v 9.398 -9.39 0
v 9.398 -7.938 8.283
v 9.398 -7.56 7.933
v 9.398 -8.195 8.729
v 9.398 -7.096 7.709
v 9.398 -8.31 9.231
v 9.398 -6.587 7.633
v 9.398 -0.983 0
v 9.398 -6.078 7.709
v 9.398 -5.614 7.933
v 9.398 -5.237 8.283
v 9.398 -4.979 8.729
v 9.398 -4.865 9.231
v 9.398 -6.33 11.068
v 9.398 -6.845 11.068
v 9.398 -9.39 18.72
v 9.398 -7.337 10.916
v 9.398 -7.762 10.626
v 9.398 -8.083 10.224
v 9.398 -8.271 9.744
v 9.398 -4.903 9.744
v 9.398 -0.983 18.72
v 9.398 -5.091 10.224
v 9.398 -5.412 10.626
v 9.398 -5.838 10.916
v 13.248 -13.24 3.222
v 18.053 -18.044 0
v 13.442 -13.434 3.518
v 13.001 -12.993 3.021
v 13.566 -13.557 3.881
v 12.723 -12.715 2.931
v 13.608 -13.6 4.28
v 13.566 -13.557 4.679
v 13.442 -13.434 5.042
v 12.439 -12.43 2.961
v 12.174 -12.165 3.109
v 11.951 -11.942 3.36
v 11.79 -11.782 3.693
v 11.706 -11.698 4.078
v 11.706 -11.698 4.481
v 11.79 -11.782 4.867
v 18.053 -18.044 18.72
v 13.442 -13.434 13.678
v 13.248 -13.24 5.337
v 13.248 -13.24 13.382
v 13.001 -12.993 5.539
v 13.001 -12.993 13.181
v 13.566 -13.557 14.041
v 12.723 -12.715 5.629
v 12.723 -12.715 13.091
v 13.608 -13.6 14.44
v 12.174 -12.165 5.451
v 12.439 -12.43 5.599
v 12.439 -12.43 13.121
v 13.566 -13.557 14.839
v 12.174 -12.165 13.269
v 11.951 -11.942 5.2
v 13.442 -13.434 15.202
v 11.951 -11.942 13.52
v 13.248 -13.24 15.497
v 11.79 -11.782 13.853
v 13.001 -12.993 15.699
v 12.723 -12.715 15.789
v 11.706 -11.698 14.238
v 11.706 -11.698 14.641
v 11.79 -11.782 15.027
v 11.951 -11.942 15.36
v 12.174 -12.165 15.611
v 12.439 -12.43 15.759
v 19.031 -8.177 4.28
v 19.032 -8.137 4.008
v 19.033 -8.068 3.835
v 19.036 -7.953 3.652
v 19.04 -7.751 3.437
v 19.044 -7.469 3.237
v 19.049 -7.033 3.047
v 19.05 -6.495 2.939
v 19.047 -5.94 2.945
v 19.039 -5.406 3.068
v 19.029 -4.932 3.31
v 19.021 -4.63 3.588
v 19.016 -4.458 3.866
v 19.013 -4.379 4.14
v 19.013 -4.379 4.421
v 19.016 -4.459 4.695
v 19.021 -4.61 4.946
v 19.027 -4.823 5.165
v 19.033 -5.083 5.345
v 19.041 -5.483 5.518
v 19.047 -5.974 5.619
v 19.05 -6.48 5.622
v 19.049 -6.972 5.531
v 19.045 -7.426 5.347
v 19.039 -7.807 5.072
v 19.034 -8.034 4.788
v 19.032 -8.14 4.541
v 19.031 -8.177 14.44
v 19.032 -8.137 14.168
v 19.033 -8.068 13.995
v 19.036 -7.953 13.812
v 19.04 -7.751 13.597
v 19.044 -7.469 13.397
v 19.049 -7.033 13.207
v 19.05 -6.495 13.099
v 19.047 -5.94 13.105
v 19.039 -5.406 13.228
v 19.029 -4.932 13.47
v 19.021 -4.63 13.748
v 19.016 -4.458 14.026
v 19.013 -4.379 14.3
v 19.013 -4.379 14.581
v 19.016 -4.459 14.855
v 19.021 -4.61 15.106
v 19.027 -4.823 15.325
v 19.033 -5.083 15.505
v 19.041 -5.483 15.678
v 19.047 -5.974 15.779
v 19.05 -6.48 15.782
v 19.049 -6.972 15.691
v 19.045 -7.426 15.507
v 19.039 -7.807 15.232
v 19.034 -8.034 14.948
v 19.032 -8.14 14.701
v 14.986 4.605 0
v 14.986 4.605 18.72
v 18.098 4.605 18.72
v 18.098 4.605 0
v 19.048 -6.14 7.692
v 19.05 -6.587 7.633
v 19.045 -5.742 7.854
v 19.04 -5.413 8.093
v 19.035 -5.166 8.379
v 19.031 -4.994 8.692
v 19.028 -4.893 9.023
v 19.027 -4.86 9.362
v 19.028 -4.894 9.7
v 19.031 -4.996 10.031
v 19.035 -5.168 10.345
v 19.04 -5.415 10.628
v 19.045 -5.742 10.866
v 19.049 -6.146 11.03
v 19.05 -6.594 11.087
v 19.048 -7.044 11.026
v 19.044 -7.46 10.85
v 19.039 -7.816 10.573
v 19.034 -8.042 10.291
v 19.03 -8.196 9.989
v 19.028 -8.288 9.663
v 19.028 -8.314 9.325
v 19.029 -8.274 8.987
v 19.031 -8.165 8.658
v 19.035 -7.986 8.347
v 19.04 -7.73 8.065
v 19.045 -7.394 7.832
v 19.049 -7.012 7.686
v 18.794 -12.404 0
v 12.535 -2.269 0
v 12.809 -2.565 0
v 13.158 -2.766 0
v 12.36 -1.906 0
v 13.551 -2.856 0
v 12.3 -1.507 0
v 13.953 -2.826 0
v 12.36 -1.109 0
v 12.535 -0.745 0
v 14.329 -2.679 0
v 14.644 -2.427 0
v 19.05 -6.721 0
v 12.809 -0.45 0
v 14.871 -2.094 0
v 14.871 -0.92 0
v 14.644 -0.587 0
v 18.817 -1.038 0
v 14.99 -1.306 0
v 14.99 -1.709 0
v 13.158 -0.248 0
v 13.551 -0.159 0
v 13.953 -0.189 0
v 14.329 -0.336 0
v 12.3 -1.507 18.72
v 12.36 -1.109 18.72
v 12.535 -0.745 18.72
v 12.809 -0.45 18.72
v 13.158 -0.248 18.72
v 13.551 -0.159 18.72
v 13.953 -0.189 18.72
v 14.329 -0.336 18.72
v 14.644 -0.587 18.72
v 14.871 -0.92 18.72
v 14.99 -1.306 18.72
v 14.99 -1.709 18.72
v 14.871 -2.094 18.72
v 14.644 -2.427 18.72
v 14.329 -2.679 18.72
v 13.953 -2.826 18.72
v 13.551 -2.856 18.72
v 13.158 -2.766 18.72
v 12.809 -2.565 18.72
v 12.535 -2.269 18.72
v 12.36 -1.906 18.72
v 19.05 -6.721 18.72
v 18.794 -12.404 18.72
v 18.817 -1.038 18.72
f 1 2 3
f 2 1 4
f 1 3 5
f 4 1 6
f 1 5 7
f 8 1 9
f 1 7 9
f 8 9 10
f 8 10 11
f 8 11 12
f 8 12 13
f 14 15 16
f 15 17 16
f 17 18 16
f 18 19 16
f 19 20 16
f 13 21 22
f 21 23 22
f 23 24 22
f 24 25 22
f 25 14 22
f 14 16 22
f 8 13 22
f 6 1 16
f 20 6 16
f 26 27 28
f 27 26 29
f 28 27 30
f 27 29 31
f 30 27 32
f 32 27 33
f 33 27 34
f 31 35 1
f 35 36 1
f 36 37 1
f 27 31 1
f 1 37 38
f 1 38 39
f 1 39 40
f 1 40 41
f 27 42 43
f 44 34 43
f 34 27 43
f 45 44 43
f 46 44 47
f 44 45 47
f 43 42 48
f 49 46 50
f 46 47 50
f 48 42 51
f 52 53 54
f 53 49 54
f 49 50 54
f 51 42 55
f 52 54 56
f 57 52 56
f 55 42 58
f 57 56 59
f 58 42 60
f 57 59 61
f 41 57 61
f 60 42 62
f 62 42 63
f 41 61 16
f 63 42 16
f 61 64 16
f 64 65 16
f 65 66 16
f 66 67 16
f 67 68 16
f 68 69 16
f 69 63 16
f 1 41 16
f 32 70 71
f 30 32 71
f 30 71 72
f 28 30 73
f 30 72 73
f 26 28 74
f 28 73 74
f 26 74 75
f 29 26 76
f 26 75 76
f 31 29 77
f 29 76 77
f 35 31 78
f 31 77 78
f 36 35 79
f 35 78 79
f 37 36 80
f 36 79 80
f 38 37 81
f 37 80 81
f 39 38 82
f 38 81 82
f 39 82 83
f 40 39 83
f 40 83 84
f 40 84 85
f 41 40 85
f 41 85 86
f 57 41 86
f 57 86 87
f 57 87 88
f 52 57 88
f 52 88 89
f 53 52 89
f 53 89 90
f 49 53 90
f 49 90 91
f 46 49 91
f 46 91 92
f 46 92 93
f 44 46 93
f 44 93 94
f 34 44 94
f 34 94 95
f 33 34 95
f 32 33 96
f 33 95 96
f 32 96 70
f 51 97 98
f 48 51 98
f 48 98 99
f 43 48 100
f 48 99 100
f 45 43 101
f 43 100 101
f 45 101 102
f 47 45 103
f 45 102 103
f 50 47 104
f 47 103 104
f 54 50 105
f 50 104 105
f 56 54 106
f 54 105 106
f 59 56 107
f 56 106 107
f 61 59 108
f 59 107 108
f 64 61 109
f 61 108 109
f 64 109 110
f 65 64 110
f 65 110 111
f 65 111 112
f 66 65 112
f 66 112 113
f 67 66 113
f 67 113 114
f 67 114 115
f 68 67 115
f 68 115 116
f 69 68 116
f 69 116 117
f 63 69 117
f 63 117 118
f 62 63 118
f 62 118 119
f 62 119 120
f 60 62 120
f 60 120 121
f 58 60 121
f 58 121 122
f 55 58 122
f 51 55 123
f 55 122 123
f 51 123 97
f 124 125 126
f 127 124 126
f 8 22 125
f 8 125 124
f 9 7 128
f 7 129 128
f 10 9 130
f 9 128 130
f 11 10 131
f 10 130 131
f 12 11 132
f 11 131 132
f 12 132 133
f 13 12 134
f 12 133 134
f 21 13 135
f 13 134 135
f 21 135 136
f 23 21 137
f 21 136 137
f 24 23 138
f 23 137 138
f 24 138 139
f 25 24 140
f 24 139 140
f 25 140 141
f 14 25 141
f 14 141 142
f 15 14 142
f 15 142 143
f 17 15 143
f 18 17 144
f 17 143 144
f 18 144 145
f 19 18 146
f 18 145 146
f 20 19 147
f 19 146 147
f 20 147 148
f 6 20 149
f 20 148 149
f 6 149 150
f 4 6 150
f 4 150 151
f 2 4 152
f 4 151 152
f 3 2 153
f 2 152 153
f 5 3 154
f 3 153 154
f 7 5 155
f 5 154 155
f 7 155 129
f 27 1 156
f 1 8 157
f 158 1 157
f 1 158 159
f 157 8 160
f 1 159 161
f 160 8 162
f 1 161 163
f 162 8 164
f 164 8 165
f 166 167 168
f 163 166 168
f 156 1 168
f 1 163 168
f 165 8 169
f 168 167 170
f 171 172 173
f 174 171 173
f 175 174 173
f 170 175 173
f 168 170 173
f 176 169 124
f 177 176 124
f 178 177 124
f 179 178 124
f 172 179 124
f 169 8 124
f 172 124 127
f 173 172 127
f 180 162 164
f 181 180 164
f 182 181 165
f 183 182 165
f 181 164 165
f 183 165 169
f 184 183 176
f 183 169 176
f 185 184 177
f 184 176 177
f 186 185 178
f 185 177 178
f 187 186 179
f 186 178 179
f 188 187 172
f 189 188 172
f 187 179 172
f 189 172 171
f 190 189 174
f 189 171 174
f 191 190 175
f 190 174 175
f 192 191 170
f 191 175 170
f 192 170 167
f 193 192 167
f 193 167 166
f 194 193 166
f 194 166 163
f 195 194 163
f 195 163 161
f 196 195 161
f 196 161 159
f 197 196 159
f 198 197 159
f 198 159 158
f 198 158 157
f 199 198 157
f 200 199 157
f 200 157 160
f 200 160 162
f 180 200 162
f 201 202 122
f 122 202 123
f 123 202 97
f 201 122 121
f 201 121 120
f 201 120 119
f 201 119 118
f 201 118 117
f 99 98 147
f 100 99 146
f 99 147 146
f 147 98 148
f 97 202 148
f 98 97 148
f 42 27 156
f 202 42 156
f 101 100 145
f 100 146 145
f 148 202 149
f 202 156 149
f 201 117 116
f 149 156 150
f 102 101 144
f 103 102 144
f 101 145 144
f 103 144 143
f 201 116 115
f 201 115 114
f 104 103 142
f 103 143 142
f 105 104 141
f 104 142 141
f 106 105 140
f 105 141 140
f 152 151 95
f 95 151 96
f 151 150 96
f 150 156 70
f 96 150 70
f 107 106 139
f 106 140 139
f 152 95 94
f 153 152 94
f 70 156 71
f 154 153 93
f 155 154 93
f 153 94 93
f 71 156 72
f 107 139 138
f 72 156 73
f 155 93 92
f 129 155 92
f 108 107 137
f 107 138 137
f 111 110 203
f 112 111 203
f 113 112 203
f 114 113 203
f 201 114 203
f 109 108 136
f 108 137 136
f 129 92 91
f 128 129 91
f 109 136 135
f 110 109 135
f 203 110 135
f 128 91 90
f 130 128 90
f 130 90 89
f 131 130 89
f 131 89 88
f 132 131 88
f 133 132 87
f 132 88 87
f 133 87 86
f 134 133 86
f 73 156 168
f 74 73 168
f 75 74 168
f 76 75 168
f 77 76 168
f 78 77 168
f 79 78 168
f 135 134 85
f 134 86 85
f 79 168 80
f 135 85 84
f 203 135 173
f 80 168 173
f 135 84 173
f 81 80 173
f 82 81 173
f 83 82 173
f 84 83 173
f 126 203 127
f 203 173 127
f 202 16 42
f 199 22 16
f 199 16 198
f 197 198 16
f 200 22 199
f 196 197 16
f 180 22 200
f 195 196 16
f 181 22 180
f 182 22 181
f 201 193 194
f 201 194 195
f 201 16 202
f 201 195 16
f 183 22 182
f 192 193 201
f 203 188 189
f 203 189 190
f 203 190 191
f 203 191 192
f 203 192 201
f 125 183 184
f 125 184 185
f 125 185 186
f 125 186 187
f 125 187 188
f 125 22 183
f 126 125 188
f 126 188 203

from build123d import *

# Parameters (mm, degrees)
EXTRUDE1_DEPTH            = 18.7198
SKETCH13_W                = 30.336118919
SKETCH13_H                = 26.43936277
EXTRUDE2_DEPTH            = 40.057833358
F_6_32_TAPPED_HOLE2_D     = 2.7051
EXTRUDE3_DEPTH            = 40.057833358
F_6_32_TAPPED_HOLE1_D     = 2.7051
F_8_32_TAPPED_HOLE5_D     = 3.4544
F_8_32_TAPPED_HOLE5_DEPTH = 19.05
F_8_32_TAPPED_HOLE5_TIP   = 1.037806461
SKETCH22_W                = 9.398
SKETCH22_H                = 21.690053411
EXTRUDE4_DEPTH            = 33.232321948
CHAMFER1_SIZE             = 5.588


with BuildPart() as part:
    # Sketch1 → Extrude1 (new body)
    with BuildSketch(Plane.XY):
        with BuildLine():
            Line((0, 0), (0, -13.17458008))
            Line((0, -13.17458008), (15.324208221, -28.498788301))
            ThreePointArc((15.324208221, -28.498788301), (19.05, -6.58729004), (15.324208221, 15.324208221))
            Line((15.324208221, 15.324208221), (0, 15.324208221))
            Line((0, 15.324208221), (0, 0))
        make_face()
    extrude(amount=EXTRUDE1_DEPTH)

    # Sketch13 → Extrude2 (cut, through all)
    with BuildSketch(Plane.XY.offset(18.7198)):
        with Locations((15.16805946, 17.825101305)):
            Rectangle(SKETCH13_W, SKETCH13_H)
    extrude(amount=-EXTRUDE2_DEPTH, mode=Mode.SUBTRACT)

    # #6-32 Tapped Hole2 (through all)
    with Locations(Plane.XY.offset(18.7198)):
        with Locations((13.6525, -1.50729004)):
            Hole(F_6_32_TAPPED_HOLE2_D / 2)

    # Sketch14 → Extrude3 (cut, through all)
    with BuildSketch(Plane.XY.offset(18.7198)):
        Polygon((0.684709755, -13.859289835), (7.276217748, -7.267781842), (18.052525094, -18.044089188), (21.915716214, -21.907280308), (15.324208221, -28.498788301), align=None)
    extrude(amount=-EXTRUDE3_DEPTH, mode=Mode.SUBTRACT)

    # #6-32 Tapped Hole1 (through all)
    with Locations(Plane(origin=(12.651735758, -12.643299852, 14.4399), x_dir=(-0.707106781187, 0.707106781187, 0), z_dir=(-0.707106781187, -0.707106781187, 0))):
        with Locations((0, 0), (0, 10.16)):
            Hole(F_6_32_TAPPED_HOLE1_D / 2)

    # #8-32 Tapped Hole5
    with Locations(Plane.ZY):
        with Locations((9.3599, -6.58729004)):
            Hole(F_8_32_TAPPED_HOLE5_D / 2, depth=F_8_32_TAPPED_HOLE5_DEPTH)
            with Locations((0, 0, -(F_8_32_TAPPED_HOLE5_DEPTH + F_8_32_TAPPED_HOLE5_TIP / 2))):  # 118° drill point
                Cone(0, F_8_32_TAPPED_HOLE5_D / 2, F_8_32_TAPPED_HOLE5_TIP, mode=Mode.SUBTRACT)

    # Sketch22 → Extrude4 (cut, through all)
    with BuildSketch(Plane.XY.offset(18.7198)):
        with Locations((4.699, -6.239606786)):
            Rectangle(SKETCH22_W, SKETCH22_H)
    extrude(amount=-EXTRUDE4_DEPTH, mode=Mode.SUBTRACT)

    # Chamfer1
    chamfer1_edges = [part.edges().sort_by_distance(p)[0] for p in [
        (9.398, 4.60541992, 9.3599),
    ]]
    chamfer(chamfer1_edges, length=CHAMFER1_SIZE)


solid = part.part
